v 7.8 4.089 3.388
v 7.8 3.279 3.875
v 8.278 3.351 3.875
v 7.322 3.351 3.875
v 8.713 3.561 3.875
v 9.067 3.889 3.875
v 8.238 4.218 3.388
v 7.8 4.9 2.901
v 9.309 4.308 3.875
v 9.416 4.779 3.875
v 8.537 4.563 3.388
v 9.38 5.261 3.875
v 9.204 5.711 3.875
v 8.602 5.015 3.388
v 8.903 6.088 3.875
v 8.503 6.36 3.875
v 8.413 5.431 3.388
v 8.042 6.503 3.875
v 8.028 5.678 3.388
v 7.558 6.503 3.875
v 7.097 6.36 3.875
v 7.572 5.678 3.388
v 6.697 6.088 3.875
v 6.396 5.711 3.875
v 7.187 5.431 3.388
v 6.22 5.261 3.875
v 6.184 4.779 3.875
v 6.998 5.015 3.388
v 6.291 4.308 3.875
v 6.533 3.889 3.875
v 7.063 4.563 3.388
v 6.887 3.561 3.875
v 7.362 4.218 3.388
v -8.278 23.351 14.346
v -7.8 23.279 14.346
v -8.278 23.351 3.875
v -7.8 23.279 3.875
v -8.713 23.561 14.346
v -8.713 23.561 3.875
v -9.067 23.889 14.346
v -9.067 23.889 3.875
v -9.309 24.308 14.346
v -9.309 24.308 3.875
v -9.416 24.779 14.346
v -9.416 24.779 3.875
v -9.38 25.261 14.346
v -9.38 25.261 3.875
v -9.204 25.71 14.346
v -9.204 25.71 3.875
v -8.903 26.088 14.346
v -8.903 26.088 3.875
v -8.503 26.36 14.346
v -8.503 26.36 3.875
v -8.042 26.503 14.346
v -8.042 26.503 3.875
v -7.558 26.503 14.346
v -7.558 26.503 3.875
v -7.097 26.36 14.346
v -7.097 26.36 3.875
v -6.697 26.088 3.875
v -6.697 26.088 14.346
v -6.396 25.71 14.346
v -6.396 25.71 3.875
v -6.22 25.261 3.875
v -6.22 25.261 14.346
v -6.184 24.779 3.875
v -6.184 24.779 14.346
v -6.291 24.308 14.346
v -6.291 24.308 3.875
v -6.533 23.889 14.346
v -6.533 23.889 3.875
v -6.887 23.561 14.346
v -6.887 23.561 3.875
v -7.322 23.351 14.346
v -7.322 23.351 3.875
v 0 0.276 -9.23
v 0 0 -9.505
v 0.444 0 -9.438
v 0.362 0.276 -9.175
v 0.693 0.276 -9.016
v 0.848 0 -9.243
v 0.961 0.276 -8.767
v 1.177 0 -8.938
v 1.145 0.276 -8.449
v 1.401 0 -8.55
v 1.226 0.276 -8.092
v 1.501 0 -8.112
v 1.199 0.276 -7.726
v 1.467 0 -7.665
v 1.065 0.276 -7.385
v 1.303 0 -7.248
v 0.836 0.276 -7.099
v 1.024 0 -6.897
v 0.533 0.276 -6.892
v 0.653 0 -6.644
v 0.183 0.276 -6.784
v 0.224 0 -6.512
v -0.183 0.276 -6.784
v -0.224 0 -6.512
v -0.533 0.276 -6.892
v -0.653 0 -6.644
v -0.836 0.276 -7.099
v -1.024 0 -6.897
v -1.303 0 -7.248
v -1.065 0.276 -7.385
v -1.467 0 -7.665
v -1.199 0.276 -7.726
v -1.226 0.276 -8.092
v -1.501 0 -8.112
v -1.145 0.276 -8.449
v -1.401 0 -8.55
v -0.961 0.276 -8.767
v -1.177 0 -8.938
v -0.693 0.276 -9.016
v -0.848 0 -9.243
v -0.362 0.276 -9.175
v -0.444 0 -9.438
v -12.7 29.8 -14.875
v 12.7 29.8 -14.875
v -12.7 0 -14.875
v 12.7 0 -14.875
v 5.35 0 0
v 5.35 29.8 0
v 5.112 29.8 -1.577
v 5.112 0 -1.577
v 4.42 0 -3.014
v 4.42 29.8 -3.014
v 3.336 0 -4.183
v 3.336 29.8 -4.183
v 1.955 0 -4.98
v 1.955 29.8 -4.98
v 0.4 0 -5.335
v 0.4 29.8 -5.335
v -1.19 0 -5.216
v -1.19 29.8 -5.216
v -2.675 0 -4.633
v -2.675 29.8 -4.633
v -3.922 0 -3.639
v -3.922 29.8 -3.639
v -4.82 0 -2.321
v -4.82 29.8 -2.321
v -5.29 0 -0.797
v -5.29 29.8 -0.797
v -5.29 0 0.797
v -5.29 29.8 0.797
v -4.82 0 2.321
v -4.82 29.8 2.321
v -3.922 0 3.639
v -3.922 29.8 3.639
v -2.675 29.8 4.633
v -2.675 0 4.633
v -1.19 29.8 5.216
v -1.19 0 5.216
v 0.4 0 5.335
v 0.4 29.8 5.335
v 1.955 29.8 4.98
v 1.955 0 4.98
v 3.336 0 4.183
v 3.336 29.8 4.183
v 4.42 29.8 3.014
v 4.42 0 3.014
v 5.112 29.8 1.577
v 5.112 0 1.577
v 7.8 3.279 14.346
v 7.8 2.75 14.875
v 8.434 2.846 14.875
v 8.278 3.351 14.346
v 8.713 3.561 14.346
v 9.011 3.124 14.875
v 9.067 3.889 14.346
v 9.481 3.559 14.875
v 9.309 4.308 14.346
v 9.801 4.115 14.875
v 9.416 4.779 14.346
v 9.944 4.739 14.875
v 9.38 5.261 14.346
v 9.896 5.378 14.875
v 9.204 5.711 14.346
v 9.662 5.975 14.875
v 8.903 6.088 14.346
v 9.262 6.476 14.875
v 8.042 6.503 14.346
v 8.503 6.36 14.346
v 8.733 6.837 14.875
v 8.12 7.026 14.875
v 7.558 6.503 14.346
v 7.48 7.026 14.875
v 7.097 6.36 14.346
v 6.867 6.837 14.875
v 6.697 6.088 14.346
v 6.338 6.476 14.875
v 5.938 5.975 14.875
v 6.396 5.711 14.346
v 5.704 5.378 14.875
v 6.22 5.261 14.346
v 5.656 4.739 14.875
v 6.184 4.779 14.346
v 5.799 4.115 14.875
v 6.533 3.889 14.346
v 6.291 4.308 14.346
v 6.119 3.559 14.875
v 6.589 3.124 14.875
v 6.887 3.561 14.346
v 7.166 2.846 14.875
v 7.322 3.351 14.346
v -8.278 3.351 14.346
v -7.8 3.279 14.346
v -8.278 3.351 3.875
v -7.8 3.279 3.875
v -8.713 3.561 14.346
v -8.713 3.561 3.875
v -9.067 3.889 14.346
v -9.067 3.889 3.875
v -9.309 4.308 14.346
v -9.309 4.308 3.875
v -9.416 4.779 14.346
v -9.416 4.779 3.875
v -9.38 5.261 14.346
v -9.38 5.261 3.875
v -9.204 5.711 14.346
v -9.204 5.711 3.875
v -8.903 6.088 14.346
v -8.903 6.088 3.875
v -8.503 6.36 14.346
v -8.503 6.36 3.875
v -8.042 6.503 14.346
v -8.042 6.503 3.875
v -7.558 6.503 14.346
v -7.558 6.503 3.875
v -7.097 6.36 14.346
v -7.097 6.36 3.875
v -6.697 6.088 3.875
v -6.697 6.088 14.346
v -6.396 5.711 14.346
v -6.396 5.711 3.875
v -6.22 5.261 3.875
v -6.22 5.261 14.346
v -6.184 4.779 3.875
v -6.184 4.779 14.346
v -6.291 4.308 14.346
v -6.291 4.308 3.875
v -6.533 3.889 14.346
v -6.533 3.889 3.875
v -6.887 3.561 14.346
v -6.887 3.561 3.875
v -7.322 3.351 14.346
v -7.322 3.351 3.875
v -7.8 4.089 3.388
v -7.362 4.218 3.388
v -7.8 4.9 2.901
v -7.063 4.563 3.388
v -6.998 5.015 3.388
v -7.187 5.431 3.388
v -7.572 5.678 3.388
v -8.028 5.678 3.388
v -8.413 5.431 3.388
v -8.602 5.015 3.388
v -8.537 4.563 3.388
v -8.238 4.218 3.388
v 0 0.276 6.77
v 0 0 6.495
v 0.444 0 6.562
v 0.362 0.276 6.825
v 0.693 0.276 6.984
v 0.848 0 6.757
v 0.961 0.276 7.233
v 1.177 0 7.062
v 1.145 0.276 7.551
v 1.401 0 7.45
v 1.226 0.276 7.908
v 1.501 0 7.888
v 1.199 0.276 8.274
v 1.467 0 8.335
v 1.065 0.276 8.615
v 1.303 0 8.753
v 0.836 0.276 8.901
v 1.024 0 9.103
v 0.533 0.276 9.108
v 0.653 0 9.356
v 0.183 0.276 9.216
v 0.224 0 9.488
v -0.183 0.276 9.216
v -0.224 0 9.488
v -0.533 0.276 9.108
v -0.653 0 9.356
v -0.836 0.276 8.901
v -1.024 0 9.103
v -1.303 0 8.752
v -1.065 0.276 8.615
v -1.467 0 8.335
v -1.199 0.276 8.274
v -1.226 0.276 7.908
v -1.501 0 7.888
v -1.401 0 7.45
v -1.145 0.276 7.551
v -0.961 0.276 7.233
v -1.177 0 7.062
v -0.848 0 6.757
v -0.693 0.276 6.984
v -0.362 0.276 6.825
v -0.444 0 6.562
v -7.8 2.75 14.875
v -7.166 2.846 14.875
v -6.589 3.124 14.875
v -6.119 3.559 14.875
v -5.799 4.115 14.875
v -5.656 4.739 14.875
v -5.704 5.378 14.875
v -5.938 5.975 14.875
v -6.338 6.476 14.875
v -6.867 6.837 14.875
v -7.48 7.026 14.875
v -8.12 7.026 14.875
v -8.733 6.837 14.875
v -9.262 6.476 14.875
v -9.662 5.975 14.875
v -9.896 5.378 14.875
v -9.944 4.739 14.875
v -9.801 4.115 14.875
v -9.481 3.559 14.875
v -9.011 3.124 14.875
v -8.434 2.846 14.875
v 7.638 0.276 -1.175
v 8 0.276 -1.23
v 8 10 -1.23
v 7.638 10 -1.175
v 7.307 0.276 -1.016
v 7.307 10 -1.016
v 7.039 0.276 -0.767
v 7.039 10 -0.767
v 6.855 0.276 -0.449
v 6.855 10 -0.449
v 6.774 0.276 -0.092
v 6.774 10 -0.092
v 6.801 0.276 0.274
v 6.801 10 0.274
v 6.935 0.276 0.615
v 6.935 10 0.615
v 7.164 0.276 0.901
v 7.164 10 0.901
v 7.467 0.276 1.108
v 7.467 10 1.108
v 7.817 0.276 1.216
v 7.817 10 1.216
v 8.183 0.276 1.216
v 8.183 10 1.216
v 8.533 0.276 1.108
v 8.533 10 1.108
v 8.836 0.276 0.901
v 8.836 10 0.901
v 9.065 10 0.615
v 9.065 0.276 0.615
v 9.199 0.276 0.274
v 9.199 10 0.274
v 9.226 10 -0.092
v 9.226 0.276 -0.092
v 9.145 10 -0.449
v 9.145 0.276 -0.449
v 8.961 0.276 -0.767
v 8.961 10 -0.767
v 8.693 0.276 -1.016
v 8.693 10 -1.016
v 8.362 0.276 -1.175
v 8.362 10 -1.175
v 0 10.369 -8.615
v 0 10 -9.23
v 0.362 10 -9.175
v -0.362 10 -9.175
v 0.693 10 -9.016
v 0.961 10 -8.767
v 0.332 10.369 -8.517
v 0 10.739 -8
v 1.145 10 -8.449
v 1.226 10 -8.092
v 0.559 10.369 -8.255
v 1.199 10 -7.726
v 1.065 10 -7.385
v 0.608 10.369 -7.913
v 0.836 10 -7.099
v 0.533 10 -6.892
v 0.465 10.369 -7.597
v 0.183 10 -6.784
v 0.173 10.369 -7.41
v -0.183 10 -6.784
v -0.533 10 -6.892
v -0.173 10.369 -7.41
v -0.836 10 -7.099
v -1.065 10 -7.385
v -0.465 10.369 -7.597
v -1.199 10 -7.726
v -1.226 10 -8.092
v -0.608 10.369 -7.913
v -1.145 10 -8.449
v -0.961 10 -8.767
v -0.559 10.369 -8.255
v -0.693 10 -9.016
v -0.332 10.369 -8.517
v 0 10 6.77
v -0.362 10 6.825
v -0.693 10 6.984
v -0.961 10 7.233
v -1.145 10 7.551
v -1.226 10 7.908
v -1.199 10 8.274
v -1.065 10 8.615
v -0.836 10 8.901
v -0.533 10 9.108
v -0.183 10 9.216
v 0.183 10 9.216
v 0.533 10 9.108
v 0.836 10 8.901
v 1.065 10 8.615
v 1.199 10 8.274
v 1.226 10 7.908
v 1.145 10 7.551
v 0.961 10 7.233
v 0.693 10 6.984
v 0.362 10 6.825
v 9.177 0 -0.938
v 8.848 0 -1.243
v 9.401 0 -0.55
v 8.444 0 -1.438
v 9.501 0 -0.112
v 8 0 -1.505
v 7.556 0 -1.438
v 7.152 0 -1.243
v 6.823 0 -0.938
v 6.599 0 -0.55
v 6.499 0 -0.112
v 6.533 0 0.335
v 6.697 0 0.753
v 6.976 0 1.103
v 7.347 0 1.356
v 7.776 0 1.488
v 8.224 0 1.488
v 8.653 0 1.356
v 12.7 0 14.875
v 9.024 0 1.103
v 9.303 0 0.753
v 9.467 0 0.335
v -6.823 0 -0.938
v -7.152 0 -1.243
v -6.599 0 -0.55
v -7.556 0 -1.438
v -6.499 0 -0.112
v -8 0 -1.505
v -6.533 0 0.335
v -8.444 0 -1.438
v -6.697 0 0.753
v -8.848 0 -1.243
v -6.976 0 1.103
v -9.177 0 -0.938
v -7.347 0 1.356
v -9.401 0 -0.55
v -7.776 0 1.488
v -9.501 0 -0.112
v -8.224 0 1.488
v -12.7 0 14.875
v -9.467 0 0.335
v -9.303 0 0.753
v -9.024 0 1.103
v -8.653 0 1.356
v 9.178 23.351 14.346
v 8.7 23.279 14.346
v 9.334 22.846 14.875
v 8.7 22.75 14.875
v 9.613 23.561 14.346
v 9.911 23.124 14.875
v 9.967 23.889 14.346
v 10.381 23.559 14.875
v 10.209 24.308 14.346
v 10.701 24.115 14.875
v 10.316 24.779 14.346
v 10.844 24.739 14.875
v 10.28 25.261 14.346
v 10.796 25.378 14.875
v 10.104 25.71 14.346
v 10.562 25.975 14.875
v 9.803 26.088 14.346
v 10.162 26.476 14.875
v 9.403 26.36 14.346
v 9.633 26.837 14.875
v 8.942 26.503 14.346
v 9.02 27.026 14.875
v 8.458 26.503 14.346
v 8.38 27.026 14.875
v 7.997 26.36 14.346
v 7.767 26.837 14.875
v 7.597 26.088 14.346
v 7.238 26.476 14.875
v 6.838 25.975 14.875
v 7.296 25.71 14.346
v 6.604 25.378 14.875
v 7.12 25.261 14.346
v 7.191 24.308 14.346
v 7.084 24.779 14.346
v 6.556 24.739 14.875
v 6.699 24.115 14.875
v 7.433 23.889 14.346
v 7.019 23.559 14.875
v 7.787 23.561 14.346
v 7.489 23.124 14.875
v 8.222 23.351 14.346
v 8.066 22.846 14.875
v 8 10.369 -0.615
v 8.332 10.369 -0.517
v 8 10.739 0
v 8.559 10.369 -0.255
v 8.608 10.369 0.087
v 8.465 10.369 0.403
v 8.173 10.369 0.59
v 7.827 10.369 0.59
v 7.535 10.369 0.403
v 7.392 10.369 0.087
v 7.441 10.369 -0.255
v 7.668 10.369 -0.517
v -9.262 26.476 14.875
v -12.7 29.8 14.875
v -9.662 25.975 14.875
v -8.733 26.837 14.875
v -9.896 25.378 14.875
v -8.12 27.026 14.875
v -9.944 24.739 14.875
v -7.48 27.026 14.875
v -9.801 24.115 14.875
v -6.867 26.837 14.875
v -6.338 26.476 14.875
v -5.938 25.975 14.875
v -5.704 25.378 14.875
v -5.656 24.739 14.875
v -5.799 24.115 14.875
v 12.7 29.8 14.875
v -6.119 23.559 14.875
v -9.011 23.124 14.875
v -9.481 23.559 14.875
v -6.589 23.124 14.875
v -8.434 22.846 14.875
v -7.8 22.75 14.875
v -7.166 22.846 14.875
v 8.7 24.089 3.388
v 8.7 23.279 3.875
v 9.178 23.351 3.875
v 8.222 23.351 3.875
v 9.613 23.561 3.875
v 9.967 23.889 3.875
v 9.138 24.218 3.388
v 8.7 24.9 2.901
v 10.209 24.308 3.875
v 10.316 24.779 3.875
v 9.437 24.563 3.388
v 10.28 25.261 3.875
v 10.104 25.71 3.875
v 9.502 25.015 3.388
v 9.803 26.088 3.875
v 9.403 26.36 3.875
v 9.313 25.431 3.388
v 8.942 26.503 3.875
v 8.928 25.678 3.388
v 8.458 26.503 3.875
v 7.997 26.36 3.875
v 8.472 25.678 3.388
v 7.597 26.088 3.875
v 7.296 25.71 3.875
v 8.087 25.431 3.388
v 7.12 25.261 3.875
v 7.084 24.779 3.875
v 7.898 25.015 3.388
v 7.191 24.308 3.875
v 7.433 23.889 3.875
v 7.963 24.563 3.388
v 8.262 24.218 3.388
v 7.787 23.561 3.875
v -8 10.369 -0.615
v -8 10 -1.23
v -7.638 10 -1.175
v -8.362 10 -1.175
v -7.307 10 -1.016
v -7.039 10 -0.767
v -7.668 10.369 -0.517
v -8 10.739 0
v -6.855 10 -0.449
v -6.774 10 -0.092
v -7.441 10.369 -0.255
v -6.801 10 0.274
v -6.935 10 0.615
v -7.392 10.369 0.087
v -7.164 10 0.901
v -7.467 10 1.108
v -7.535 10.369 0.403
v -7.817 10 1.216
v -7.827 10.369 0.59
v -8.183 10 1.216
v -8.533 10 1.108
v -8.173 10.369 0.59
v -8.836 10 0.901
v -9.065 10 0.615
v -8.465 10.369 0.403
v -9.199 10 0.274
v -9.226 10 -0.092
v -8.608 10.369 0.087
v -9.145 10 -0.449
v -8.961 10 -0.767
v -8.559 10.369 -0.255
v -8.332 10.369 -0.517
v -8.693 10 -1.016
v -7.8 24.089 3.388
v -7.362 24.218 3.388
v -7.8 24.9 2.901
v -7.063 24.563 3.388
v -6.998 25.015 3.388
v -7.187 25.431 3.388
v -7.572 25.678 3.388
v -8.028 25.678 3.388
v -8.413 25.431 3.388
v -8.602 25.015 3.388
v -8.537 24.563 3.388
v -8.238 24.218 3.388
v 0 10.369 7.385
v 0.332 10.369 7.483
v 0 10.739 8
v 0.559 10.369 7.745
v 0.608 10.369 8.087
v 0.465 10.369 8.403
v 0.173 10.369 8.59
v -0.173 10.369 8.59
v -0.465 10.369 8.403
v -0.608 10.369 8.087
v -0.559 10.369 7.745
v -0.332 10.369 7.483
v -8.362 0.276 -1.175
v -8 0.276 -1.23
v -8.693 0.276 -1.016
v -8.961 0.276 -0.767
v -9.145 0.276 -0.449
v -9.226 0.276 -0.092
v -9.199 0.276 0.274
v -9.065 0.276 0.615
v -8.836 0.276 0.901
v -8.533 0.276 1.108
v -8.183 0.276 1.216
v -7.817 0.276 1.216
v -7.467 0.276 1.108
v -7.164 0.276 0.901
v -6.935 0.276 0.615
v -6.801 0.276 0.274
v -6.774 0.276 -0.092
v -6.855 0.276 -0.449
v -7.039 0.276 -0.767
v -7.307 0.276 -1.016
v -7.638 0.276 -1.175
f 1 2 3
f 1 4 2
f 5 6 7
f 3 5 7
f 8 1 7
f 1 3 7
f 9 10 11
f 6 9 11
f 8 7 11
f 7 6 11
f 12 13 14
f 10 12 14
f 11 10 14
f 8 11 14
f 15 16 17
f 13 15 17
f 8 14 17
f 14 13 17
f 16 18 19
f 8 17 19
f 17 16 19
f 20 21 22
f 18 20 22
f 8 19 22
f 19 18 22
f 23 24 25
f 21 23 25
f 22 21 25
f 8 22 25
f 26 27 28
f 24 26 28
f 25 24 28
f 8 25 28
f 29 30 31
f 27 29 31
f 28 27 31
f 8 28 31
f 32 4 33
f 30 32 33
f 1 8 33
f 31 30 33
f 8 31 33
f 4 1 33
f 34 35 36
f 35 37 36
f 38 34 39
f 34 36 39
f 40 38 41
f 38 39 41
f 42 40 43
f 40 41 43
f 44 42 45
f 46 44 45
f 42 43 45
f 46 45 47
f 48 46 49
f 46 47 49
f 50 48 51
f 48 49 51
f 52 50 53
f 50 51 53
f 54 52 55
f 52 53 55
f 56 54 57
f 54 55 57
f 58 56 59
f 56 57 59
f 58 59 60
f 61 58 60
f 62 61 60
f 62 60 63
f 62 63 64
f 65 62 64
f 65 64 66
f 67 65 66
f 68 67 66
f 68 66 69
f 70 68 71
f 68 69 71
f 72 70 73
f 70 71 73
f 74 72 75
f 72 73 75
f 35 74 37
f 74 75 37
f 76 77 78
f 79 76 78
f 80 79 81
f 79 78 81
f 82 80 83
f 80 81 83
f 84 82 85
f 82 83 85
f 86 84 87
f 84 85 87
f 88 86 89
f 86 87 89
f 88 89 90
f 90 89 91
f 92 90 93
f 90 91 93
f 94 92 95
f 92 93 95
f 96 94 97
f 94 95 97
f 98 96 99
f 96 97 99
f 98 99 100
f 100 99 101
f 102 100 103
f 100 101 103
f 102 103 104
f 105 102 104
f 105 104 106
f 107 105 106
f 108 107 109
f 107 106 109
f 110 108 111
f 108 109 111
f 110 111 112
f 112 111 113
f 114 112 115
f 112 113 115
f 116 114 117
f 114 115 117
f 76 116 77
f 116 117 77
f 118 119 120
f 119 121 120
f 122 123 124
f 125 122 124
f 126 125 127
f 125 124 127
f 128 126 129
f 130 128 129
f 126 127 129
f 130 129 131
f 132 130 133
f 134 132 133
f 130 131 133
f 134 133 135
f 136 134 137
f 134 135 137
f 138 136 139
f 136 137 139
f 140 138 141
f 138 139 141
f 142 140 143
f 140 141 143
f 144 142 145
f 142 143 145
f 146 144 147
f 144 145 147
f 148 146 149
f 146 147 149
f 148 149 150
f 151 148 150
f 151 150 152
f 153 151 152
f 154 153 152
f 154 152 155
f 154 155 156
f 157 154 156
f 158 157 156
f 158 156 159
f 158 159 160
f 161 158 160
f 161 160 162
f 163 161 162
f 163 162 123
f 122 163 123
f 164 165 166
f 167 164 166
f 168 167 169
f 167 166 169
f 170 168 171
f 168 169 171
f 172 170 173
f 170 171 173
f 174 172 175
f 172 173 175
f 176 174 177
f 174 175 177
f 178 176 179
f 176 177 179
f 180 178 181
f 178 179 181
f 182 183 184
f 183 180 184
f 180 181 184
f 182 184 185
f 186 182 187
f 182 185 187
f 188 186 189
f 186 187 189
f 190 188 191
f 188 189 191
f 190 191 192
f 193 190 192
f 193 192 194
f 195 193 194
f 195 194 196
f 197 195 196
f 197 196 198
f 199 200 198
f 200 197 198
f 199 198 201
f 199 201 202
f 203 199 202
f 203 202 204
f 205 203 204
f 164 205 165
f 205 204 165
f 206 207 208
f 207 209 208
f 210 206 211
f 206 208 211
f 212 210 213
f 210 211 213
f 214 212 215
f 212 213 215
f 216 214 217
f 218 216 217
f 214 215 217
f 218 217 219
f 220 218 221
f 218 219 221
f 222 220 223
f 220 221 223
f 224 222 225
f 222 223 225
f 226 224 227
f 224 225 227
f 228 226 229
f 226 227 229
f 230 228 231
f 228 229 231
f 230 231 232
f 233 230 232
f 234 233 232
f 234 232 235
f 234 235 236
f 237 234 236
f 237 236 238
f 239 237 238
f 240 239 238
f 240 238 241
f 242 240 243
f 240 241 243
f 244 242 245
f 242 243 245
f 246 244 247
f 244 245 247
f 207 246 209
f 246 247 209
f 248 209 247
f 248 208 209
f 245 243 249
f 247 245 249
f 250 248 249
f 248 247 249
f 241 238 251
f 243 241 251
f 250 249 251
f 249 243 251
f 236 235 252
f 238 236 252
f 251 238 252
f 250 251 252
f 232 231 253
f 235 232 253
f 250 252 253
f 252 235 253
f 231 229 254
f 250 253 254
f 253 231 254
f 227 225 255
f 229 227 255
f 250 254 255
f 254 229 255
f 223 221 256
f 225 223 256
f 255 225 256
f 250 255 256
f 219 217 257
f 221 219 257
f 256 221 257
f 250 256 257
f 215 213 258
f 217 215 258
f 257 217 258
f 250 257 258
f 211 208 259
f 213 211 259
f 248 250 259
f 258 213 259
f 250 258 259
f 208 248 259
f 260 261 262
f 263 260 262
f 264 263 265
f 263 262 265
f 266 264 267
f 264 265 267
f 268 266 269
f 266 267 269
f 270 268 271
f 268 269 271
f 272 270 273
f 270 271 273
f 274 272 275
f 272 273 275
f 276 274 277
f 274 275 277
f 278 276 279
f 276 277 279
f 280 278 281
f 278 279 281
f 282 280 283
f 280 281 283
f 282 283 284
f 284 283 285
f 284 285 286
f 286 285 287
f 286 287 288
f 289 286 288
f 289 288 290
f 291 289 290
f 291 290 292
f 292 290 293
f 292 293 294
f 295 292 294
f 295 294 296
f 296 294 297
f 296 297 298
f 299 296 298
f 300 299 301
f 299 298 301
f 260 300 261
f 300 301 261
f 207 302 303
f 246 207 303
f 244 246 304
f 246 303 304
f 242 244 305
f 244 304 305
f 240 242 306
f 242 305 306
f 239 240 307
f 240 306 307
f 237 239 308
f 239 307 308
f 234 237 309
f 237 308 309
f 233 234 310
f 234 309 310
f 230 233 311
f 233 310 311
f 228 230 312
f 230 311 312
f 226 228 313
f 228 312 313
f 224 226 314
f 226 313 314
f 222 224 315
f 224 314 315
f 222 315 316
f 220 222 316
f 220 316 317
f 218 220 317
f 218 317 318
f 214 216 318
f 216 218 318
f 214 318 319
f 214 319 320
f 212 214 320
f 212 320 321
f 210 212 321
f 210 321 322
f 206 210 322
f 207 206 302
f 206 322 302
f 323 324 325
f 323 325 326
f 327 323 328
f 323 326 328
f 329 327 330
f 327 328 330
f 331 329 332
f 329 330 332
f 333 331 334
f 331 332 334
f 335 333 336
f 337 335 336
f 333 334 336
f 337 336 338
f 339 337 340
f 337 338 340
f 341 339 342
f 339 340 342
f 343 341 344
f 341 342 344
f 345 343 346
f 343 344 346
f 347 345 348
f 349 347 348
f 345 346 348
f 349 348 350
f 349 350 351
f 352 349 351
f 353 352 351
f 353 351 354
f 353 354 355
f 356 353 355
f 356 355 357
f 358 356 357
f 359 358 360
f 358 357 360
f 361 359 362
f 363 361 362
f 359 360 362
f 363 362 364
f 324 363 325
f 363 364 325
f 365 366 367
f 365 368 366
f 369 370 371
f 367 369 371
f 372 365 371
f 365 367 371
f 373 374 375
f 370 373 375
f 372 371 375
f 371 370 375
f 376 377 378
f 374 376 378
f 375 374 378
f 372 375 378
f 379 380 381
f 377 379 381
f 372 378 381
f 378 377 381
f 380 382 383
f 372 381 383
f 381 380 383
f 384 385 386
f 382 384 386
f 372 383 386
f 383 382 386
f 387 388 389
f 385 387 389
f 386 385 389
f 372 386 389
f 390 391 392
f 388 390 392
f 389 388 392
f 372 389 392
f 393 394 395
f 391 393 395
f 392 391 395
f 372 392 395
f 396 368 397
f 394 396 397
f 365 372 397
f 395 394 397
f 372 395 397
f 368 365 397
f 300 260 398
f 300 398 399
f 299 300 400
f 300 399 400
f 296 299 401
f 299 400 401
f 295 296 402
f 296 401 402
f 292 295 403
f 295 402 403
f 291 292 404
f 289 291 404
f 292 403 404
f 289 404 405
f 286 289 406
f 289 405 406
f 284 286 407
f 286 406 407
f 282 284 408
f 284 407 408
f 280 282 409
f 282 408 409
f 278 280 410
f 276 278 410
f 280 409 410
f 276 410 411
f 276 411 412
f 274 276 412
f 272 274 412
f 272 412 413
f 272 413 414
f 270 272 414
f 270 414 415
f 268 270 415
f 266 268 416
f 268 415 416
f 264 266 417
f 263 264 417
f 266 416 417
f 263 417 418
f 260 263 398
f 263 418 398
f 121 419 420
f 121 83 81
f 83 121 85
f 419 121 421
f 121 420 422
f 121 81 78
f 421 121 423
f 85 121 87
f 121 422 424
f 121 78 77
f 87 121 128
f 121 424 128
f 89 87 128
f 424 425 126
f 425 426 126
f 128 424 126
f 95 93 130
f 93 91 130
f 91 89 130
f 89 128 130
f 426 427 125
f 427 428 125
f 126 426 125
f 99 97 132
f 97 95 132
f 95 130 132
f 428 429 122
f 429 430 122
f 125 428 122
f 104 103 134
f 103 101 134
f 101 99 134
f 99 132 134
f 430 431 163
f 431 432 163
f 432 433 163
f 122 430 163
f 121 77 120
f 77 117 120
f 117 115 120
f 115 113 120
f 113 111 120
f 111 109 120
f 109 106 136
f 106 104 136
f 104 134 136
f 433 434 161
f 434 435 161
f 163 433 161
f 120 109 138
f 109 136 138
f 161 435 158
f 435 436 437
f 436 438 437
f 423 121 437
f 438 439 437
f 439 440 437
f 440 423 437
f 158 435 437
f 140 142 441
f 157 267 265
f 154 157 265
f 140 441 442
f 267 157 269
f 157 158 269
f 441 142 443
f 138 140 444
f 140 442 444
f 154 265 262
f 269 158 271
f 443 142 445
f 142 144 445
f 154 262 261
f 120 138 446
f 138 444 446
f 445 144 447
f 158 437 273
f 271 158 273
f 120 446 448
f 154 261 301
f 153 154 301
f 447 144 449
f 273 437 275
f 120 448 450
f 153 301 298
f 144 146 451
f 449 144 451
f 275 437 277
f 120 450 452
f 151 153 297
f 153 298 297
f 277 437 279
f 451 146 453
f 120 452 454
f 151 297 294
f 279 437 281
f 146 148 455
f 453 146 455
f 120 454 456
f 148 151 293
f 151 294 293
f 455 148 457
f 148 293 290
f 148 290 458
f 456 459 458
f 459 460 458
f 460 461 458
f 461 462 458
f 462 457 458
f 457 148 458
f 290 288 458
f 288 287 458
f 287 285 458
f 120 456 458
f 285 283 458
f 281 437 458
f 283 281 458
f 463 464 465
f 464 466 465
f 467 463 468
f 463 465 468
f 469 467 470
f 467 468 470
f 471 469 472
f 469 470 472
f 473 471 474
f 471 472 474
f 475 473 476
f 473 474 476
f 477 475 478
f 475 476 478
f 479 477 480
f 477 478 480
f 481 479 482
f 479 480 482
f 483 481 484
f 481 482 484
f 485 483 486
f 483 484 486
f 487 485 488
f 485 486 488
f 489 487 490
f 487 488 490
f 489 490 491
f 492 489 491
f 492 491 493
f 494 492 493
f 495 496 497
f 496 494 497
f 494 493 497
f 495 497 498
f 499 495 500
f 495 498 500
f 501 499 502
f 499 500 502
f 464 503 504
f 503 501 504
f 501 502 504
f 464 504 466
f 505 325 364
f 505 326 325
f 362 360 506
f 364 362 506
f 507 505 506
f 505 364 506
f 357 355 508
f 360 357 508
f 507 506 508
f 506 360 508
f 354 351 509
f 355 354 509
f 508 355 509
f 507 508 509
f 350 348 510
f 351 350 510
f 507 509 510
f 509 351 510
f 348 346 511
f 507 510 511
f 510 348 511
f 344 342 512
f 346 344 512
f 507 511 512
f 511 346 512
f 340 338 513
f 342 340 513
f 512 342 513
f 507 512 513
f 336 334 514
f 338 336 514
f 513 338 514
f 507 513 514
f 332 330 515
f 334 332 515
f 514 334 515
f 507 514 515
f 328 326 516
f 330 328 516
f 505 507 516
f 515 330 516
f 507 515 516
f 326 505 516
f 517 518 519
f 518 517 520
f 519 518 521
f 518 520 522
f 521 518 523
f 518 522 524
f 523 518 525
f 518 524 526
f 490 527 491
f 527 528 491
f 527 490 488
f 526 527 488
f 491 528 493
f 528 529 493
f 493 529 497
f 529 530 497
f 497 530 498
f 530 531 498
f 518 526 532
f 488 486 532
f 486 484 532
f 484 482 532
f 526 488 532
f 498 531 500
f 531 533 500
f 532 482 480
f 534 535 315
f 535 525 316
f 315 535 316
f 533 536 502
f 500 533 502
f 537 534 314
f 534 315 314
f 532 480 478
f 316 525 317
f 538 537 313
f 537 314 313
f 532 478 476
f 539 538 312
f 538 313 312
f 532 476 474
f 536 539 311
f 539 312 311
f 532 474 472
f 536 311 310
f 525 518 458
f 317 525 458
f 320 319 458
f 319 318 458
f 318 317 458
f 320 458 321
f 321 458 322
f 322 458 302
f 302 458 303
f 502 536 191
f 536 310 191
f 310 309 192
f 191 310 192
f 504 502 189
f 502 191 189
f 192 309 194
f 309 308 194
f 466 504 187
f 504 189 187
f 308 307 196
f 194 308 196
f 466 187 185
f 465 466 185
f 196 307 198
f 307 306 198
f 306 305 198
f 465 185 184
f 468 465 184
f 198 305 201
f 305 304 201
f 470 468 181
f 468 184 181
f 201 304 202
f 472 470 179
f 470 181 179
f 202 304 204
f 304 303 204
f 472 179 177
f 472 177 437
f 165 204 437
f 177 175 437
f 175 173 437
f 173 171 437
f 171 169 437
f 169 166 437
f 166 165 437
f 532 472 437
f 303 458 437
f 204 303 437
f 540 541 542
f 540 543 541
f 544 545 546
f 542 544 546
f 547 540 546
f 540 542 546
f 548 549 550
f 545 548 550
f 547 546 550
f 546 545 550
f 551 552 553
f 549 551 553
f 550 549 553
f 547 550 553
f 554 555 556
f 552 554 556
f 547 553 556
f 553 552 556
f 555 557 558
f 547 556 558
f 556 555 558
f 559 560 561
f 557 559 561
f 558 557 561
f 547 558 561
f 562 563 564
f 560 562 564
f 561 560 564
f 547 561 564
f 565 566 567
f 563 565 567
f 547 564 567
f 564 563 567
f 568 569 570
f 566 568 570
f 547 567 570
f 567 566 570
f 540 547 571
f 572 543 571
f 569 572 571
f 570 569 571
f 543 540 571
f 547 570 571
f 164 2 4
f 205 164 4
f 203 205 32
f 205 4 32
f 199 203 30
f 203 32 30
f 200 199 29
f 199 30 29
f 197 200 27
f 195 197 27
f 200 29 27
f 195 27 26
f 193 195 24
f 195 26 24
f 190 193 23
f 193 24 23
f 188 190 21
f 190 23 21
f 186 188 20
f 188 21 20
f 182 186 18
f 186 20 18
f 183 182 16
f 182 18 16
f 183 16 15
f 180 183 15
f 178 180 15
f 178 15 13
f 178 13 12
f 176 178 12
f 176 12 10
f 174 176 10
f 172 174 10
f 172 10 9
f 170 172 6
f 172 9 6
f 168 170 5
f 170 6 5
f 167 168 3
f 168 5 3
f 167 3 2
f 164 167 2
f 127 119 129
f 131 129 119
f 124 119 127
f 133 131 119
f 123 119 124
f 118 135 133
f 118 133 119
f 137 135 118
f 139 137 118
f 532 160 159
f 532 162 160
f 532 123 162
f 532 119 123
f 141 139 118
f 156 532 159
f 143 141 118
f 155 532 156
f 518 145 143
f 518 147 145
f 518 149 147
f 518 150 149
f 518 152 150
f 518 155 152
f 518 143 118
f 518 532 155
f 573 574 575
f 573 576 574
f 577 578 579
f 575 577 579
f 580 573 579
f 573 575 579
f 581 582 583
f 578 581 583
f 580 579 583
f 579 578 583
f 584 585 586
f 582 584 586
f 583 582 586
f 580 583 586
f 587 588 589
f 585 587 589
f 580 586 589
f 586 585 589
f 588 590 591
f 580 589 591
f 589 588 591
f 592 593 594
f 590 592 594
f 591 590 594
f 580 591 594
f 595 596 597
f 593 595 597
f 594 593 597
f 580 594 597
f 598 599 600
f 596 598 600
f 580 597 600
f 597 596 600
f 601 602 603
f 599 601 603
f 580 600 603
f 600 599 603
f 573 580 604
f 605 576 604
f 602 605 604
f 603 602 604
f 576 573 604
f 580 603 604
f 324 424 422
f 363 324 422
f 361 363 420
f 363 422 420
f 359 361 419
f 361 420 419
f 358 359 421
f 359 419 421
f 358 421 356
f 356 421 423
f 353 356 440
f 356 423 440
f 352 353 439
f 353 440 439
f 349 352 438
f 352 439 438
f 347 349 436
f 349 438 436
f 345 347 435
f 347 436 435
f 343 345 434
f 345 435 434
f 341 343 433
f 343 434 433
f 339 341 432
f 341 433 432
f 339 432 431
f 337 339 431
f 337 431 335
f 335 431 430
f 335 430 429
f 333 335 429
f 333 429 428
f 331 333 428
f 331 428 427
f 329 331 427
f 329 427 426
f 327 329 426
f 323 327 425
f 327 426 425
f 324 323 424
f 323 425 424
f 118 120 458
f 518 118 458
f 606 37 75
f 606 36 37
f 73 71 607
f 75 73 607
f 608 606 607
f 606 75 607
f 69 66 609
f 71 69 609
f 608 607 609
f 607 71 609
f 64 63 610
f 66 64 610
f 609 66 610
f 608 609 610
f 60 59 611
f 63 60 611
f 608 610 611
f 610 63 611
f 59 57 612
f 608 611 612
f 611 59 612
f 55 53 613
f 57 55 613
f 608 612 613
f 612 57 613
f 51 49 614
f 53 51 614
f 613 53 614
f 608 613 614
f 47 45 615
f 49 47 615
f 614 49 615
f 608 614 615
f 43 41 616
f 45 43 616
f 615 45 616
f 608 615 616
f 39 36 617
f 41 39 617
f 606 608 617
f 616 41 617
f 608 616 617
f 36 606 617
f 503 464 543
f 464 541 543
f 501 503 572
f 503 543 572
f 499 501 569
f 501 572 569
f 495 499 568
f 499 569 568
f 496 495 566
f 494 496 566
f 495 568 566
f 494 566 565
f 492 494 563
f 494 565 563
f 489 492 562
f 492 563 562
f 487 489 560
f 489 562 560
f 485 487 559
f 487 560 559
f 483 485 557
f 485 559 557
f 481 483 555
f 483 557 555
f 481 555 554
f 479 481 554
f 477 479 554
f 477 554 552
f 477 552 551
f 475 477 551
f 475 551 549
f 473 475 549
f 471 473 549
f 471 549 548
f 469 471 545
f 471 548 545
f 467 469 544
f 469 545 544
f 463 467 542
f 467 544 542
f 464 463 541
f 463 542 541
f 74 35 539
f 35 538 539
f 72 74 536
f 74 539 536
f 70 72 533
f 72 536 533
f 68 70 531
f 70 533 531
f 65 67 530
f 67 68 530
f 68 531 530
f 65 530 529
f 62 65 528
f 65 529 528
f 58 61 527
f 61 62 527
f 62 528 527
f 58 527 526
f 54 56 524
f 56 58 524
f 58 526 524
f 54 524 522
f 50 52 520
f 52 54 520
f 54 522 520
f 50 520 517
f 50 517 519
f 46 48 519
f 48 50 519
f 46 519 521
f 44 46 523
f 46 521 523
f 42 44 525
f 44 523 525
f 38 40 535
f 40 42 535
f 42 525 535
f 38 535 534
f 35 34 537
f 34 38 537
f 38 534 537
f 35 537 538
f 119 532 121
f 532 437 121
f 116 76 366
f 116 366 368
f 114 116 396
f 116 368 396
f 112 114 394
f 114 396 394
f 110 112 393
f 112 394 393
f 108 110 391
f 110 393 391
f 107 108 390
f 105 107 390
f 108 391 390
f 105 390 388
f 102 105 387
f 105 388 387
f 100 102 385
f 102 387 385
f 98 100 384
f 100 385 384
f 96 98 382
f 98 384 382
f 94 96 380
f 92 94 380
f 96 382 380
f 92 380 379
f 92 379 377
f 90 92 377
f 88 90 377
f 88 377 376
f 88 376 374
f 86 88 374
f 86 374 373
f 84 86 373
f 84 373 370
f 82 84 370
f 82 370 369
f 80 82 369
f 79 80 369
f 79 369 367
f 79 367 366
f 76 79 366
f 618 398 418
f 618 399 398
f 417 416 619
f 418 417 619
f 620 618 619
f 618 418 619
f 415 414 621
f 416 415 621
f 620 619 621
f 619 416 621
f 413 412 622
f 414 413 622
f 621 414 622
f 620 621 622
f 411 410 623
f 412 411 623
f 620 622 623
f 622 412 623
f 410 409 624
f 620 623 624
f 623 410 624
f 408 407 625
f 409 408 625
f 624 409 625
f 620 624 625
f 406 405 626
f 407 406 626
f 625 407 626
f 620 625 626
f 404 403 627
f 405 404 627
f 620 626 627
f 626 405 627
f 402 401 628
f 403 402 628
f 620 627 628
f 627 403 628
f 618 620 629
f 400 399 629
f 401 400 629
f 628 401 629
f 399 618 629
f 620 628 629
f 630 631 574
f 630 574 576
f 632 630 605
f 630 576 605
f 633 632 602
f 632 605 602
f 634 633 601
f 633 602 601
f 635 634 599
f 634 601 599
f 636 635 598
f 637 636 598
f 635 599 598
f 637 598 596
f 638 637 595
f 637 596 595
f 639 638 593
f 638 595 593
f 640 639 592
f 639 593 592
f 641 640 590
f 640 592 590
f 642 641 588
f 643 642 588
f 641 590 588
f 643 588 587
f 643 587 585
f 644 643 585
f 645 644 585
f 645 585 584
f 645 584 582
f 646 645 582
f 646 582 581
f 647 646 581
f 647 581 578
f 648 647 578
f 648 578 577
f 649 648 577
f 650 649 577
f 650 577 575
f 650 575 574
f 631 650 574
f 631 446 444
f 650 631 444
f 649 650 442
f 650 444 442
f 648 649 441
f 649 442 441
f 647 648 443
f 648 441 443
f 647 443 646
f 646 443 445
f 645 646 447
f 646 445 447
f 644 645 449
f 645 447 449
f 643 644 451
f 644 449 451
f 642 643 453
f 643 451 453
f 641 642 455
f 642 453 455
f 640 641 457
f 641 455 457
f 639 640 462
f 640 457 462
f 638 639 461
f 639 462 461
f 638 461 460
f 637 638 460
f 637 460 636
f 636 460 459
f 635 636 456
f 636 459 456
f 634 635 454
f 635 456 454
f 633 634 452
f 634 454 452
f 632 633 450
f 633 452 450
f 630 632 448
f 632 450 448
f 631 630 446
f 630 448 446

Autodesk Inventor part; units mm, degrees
ref_plane "YZ Plane" through (0, 0, 0) normal (1, 0, 0) x (0, 1, 0)
ref_plane "XZ Plane" through (0, 0, 0) normal (0, 1, 0) x (-1, 0, 0)
ref_plane "XY Plane" through (0, 0, 0) normal (0, 0, 1) x (1, 0, 0)
sketch "Sketch1" plane through (0, 0, 0) normal (0, 1, 0) x (-1, 0, 0)
  line L0 (12.7, 14.875) -> (-12.7, 14.875)
  line L1 (-12.7, 14.875) -> (-12.7, -14.875)
  line L2 (-12.7, -14.875) -> (12.7, -14.875)
  line L3 (12.7, -14.875) -> (12.7, 14.875)
  point P0 (0, 0)
  dimension "d0" = 29.75
  dimension "d1" = 25.4
  dimension "d2" = 12.7
  dimension "d3" = 14.875
extrude "Extrusion1" add sketch "Sketch1" along normal blind 29.8
sketch "Sketch2" plane through (0, 29.8, 0) normal (0, 1, 0) x (1, 0, 0)
  circle A0 centre (0, 0) radius 5.35
  line L0 (12.7, 14.875) -> (-12.7, 14.875) projected
  line L1 (-12.7, 14.875) -> (-12.7, -14.875) projected
  line L2 (-12.7, -14.875) -> (12.7, -14.875) projected
  dimension "d7" = 10.7
  dimension "d8" = 14.875
  dimension "d9" = 12.7
  dimension "d12" = 14.875
extrude "Extrusion2" cut sketch "Sketch2" against normal through all
sketch "Sketch3" plane through (-12.7, 0, 14.875) normal (0, 0, 1) x (1, 0, 0)
  circle A0 centre (4.9, 24.9) radius 1.9
  circle A1 centre (21.4, 24.9) radius 1.9
  circle A2 centre (20.5, 4.9) radius 1.9
  circle A3 centre (4.9, 4.9) radius 1.9
  line L0 (0, 29.8) -> (25.4, 29.8) projected
  line L1 (0, 0) -> (0, 29.8) projected
  line L2 (0, 0) -> (25.4, 0) projected
  line L3 (25.4, 0) -> (25.4, 29.8) projected
  point P0 (12.7, 0)
  dimension "d13" = 3.8
  dimension "d14" = 3.8
  dimension "d15" = 3.8
  dimension "d16" = 3.8
  dimension "d17" = 4.9
  dimension "d18" = 4.9
  dimension "d19" = 4.9
  dimension "d20" = 4.9
  dimension "d21" = 4.9
  dimension "d22" = 4.9
  dimension "d23" = 4.9
  dimension "d24" = 4
hole "Hole1" at (-7.8, 24.9, 14.875) at (8.7, 24.9, 14.875) at (7.8, 4.9, 14.875) at (-7.8, 4.9, 14.875) direction (0, 0, -1) diameter 3.242 depth 11 tip angle 118 countersink diameter 4.3 countersink angle 90 thread size "M4x0.7" class "6H" standard "ANSI Metric M Profile"
sketch "Sketch4" plane through (0, 0, 0) normal (0, -1, 0) x (1, 0, 0)
  circle A0 centre (8, 0) radius 1.5
  circle A1 centre (0, -8) radius 1.5
  circle A2 centre (-8, 0) radius 1.5
  circle A3 centre (0, 8) radius 1.5
  line L0 (12.7, 14.875) -> (12.7, -14.875) projected
  line L1 (-12.7, -14.875) -> (-12.7, 14.875) projected
  line L2 (-12.7, 14.875) -> (12.7, 14.875) projected
  line L3 (12.7, -14.875) -> (-12.7, -14.875) projected
  point P0 (0, 0)
  dimension "d32" = 3
  dimension "d33" = 3
  dimension "d34" = 8
  dimension "d35" = 8
  dimension "d36" = 3
  dimension "d37" = 3
  dimension "d38" = 8
  dimension "d39" = 8
  dimension "d40" = 12.7
  dimension "d41" = 12.7
  dimension "d42" = 14.875
  dimension "d43" = 14.875
hole "Hole2" at (8, 0, 0) at (0, 0, -8) at (-8, 0, 0) at (0, 0, 8) direction (0, 1, 0) diameter 2.459 depth 10 tip angle 118 countersink diameter 3.01 countersink angle 90 thread size "M3x0.5" class "6H" standard "ANSI Metric M Profile"
properties part number "Z-AXIS SCREW SEAT"
